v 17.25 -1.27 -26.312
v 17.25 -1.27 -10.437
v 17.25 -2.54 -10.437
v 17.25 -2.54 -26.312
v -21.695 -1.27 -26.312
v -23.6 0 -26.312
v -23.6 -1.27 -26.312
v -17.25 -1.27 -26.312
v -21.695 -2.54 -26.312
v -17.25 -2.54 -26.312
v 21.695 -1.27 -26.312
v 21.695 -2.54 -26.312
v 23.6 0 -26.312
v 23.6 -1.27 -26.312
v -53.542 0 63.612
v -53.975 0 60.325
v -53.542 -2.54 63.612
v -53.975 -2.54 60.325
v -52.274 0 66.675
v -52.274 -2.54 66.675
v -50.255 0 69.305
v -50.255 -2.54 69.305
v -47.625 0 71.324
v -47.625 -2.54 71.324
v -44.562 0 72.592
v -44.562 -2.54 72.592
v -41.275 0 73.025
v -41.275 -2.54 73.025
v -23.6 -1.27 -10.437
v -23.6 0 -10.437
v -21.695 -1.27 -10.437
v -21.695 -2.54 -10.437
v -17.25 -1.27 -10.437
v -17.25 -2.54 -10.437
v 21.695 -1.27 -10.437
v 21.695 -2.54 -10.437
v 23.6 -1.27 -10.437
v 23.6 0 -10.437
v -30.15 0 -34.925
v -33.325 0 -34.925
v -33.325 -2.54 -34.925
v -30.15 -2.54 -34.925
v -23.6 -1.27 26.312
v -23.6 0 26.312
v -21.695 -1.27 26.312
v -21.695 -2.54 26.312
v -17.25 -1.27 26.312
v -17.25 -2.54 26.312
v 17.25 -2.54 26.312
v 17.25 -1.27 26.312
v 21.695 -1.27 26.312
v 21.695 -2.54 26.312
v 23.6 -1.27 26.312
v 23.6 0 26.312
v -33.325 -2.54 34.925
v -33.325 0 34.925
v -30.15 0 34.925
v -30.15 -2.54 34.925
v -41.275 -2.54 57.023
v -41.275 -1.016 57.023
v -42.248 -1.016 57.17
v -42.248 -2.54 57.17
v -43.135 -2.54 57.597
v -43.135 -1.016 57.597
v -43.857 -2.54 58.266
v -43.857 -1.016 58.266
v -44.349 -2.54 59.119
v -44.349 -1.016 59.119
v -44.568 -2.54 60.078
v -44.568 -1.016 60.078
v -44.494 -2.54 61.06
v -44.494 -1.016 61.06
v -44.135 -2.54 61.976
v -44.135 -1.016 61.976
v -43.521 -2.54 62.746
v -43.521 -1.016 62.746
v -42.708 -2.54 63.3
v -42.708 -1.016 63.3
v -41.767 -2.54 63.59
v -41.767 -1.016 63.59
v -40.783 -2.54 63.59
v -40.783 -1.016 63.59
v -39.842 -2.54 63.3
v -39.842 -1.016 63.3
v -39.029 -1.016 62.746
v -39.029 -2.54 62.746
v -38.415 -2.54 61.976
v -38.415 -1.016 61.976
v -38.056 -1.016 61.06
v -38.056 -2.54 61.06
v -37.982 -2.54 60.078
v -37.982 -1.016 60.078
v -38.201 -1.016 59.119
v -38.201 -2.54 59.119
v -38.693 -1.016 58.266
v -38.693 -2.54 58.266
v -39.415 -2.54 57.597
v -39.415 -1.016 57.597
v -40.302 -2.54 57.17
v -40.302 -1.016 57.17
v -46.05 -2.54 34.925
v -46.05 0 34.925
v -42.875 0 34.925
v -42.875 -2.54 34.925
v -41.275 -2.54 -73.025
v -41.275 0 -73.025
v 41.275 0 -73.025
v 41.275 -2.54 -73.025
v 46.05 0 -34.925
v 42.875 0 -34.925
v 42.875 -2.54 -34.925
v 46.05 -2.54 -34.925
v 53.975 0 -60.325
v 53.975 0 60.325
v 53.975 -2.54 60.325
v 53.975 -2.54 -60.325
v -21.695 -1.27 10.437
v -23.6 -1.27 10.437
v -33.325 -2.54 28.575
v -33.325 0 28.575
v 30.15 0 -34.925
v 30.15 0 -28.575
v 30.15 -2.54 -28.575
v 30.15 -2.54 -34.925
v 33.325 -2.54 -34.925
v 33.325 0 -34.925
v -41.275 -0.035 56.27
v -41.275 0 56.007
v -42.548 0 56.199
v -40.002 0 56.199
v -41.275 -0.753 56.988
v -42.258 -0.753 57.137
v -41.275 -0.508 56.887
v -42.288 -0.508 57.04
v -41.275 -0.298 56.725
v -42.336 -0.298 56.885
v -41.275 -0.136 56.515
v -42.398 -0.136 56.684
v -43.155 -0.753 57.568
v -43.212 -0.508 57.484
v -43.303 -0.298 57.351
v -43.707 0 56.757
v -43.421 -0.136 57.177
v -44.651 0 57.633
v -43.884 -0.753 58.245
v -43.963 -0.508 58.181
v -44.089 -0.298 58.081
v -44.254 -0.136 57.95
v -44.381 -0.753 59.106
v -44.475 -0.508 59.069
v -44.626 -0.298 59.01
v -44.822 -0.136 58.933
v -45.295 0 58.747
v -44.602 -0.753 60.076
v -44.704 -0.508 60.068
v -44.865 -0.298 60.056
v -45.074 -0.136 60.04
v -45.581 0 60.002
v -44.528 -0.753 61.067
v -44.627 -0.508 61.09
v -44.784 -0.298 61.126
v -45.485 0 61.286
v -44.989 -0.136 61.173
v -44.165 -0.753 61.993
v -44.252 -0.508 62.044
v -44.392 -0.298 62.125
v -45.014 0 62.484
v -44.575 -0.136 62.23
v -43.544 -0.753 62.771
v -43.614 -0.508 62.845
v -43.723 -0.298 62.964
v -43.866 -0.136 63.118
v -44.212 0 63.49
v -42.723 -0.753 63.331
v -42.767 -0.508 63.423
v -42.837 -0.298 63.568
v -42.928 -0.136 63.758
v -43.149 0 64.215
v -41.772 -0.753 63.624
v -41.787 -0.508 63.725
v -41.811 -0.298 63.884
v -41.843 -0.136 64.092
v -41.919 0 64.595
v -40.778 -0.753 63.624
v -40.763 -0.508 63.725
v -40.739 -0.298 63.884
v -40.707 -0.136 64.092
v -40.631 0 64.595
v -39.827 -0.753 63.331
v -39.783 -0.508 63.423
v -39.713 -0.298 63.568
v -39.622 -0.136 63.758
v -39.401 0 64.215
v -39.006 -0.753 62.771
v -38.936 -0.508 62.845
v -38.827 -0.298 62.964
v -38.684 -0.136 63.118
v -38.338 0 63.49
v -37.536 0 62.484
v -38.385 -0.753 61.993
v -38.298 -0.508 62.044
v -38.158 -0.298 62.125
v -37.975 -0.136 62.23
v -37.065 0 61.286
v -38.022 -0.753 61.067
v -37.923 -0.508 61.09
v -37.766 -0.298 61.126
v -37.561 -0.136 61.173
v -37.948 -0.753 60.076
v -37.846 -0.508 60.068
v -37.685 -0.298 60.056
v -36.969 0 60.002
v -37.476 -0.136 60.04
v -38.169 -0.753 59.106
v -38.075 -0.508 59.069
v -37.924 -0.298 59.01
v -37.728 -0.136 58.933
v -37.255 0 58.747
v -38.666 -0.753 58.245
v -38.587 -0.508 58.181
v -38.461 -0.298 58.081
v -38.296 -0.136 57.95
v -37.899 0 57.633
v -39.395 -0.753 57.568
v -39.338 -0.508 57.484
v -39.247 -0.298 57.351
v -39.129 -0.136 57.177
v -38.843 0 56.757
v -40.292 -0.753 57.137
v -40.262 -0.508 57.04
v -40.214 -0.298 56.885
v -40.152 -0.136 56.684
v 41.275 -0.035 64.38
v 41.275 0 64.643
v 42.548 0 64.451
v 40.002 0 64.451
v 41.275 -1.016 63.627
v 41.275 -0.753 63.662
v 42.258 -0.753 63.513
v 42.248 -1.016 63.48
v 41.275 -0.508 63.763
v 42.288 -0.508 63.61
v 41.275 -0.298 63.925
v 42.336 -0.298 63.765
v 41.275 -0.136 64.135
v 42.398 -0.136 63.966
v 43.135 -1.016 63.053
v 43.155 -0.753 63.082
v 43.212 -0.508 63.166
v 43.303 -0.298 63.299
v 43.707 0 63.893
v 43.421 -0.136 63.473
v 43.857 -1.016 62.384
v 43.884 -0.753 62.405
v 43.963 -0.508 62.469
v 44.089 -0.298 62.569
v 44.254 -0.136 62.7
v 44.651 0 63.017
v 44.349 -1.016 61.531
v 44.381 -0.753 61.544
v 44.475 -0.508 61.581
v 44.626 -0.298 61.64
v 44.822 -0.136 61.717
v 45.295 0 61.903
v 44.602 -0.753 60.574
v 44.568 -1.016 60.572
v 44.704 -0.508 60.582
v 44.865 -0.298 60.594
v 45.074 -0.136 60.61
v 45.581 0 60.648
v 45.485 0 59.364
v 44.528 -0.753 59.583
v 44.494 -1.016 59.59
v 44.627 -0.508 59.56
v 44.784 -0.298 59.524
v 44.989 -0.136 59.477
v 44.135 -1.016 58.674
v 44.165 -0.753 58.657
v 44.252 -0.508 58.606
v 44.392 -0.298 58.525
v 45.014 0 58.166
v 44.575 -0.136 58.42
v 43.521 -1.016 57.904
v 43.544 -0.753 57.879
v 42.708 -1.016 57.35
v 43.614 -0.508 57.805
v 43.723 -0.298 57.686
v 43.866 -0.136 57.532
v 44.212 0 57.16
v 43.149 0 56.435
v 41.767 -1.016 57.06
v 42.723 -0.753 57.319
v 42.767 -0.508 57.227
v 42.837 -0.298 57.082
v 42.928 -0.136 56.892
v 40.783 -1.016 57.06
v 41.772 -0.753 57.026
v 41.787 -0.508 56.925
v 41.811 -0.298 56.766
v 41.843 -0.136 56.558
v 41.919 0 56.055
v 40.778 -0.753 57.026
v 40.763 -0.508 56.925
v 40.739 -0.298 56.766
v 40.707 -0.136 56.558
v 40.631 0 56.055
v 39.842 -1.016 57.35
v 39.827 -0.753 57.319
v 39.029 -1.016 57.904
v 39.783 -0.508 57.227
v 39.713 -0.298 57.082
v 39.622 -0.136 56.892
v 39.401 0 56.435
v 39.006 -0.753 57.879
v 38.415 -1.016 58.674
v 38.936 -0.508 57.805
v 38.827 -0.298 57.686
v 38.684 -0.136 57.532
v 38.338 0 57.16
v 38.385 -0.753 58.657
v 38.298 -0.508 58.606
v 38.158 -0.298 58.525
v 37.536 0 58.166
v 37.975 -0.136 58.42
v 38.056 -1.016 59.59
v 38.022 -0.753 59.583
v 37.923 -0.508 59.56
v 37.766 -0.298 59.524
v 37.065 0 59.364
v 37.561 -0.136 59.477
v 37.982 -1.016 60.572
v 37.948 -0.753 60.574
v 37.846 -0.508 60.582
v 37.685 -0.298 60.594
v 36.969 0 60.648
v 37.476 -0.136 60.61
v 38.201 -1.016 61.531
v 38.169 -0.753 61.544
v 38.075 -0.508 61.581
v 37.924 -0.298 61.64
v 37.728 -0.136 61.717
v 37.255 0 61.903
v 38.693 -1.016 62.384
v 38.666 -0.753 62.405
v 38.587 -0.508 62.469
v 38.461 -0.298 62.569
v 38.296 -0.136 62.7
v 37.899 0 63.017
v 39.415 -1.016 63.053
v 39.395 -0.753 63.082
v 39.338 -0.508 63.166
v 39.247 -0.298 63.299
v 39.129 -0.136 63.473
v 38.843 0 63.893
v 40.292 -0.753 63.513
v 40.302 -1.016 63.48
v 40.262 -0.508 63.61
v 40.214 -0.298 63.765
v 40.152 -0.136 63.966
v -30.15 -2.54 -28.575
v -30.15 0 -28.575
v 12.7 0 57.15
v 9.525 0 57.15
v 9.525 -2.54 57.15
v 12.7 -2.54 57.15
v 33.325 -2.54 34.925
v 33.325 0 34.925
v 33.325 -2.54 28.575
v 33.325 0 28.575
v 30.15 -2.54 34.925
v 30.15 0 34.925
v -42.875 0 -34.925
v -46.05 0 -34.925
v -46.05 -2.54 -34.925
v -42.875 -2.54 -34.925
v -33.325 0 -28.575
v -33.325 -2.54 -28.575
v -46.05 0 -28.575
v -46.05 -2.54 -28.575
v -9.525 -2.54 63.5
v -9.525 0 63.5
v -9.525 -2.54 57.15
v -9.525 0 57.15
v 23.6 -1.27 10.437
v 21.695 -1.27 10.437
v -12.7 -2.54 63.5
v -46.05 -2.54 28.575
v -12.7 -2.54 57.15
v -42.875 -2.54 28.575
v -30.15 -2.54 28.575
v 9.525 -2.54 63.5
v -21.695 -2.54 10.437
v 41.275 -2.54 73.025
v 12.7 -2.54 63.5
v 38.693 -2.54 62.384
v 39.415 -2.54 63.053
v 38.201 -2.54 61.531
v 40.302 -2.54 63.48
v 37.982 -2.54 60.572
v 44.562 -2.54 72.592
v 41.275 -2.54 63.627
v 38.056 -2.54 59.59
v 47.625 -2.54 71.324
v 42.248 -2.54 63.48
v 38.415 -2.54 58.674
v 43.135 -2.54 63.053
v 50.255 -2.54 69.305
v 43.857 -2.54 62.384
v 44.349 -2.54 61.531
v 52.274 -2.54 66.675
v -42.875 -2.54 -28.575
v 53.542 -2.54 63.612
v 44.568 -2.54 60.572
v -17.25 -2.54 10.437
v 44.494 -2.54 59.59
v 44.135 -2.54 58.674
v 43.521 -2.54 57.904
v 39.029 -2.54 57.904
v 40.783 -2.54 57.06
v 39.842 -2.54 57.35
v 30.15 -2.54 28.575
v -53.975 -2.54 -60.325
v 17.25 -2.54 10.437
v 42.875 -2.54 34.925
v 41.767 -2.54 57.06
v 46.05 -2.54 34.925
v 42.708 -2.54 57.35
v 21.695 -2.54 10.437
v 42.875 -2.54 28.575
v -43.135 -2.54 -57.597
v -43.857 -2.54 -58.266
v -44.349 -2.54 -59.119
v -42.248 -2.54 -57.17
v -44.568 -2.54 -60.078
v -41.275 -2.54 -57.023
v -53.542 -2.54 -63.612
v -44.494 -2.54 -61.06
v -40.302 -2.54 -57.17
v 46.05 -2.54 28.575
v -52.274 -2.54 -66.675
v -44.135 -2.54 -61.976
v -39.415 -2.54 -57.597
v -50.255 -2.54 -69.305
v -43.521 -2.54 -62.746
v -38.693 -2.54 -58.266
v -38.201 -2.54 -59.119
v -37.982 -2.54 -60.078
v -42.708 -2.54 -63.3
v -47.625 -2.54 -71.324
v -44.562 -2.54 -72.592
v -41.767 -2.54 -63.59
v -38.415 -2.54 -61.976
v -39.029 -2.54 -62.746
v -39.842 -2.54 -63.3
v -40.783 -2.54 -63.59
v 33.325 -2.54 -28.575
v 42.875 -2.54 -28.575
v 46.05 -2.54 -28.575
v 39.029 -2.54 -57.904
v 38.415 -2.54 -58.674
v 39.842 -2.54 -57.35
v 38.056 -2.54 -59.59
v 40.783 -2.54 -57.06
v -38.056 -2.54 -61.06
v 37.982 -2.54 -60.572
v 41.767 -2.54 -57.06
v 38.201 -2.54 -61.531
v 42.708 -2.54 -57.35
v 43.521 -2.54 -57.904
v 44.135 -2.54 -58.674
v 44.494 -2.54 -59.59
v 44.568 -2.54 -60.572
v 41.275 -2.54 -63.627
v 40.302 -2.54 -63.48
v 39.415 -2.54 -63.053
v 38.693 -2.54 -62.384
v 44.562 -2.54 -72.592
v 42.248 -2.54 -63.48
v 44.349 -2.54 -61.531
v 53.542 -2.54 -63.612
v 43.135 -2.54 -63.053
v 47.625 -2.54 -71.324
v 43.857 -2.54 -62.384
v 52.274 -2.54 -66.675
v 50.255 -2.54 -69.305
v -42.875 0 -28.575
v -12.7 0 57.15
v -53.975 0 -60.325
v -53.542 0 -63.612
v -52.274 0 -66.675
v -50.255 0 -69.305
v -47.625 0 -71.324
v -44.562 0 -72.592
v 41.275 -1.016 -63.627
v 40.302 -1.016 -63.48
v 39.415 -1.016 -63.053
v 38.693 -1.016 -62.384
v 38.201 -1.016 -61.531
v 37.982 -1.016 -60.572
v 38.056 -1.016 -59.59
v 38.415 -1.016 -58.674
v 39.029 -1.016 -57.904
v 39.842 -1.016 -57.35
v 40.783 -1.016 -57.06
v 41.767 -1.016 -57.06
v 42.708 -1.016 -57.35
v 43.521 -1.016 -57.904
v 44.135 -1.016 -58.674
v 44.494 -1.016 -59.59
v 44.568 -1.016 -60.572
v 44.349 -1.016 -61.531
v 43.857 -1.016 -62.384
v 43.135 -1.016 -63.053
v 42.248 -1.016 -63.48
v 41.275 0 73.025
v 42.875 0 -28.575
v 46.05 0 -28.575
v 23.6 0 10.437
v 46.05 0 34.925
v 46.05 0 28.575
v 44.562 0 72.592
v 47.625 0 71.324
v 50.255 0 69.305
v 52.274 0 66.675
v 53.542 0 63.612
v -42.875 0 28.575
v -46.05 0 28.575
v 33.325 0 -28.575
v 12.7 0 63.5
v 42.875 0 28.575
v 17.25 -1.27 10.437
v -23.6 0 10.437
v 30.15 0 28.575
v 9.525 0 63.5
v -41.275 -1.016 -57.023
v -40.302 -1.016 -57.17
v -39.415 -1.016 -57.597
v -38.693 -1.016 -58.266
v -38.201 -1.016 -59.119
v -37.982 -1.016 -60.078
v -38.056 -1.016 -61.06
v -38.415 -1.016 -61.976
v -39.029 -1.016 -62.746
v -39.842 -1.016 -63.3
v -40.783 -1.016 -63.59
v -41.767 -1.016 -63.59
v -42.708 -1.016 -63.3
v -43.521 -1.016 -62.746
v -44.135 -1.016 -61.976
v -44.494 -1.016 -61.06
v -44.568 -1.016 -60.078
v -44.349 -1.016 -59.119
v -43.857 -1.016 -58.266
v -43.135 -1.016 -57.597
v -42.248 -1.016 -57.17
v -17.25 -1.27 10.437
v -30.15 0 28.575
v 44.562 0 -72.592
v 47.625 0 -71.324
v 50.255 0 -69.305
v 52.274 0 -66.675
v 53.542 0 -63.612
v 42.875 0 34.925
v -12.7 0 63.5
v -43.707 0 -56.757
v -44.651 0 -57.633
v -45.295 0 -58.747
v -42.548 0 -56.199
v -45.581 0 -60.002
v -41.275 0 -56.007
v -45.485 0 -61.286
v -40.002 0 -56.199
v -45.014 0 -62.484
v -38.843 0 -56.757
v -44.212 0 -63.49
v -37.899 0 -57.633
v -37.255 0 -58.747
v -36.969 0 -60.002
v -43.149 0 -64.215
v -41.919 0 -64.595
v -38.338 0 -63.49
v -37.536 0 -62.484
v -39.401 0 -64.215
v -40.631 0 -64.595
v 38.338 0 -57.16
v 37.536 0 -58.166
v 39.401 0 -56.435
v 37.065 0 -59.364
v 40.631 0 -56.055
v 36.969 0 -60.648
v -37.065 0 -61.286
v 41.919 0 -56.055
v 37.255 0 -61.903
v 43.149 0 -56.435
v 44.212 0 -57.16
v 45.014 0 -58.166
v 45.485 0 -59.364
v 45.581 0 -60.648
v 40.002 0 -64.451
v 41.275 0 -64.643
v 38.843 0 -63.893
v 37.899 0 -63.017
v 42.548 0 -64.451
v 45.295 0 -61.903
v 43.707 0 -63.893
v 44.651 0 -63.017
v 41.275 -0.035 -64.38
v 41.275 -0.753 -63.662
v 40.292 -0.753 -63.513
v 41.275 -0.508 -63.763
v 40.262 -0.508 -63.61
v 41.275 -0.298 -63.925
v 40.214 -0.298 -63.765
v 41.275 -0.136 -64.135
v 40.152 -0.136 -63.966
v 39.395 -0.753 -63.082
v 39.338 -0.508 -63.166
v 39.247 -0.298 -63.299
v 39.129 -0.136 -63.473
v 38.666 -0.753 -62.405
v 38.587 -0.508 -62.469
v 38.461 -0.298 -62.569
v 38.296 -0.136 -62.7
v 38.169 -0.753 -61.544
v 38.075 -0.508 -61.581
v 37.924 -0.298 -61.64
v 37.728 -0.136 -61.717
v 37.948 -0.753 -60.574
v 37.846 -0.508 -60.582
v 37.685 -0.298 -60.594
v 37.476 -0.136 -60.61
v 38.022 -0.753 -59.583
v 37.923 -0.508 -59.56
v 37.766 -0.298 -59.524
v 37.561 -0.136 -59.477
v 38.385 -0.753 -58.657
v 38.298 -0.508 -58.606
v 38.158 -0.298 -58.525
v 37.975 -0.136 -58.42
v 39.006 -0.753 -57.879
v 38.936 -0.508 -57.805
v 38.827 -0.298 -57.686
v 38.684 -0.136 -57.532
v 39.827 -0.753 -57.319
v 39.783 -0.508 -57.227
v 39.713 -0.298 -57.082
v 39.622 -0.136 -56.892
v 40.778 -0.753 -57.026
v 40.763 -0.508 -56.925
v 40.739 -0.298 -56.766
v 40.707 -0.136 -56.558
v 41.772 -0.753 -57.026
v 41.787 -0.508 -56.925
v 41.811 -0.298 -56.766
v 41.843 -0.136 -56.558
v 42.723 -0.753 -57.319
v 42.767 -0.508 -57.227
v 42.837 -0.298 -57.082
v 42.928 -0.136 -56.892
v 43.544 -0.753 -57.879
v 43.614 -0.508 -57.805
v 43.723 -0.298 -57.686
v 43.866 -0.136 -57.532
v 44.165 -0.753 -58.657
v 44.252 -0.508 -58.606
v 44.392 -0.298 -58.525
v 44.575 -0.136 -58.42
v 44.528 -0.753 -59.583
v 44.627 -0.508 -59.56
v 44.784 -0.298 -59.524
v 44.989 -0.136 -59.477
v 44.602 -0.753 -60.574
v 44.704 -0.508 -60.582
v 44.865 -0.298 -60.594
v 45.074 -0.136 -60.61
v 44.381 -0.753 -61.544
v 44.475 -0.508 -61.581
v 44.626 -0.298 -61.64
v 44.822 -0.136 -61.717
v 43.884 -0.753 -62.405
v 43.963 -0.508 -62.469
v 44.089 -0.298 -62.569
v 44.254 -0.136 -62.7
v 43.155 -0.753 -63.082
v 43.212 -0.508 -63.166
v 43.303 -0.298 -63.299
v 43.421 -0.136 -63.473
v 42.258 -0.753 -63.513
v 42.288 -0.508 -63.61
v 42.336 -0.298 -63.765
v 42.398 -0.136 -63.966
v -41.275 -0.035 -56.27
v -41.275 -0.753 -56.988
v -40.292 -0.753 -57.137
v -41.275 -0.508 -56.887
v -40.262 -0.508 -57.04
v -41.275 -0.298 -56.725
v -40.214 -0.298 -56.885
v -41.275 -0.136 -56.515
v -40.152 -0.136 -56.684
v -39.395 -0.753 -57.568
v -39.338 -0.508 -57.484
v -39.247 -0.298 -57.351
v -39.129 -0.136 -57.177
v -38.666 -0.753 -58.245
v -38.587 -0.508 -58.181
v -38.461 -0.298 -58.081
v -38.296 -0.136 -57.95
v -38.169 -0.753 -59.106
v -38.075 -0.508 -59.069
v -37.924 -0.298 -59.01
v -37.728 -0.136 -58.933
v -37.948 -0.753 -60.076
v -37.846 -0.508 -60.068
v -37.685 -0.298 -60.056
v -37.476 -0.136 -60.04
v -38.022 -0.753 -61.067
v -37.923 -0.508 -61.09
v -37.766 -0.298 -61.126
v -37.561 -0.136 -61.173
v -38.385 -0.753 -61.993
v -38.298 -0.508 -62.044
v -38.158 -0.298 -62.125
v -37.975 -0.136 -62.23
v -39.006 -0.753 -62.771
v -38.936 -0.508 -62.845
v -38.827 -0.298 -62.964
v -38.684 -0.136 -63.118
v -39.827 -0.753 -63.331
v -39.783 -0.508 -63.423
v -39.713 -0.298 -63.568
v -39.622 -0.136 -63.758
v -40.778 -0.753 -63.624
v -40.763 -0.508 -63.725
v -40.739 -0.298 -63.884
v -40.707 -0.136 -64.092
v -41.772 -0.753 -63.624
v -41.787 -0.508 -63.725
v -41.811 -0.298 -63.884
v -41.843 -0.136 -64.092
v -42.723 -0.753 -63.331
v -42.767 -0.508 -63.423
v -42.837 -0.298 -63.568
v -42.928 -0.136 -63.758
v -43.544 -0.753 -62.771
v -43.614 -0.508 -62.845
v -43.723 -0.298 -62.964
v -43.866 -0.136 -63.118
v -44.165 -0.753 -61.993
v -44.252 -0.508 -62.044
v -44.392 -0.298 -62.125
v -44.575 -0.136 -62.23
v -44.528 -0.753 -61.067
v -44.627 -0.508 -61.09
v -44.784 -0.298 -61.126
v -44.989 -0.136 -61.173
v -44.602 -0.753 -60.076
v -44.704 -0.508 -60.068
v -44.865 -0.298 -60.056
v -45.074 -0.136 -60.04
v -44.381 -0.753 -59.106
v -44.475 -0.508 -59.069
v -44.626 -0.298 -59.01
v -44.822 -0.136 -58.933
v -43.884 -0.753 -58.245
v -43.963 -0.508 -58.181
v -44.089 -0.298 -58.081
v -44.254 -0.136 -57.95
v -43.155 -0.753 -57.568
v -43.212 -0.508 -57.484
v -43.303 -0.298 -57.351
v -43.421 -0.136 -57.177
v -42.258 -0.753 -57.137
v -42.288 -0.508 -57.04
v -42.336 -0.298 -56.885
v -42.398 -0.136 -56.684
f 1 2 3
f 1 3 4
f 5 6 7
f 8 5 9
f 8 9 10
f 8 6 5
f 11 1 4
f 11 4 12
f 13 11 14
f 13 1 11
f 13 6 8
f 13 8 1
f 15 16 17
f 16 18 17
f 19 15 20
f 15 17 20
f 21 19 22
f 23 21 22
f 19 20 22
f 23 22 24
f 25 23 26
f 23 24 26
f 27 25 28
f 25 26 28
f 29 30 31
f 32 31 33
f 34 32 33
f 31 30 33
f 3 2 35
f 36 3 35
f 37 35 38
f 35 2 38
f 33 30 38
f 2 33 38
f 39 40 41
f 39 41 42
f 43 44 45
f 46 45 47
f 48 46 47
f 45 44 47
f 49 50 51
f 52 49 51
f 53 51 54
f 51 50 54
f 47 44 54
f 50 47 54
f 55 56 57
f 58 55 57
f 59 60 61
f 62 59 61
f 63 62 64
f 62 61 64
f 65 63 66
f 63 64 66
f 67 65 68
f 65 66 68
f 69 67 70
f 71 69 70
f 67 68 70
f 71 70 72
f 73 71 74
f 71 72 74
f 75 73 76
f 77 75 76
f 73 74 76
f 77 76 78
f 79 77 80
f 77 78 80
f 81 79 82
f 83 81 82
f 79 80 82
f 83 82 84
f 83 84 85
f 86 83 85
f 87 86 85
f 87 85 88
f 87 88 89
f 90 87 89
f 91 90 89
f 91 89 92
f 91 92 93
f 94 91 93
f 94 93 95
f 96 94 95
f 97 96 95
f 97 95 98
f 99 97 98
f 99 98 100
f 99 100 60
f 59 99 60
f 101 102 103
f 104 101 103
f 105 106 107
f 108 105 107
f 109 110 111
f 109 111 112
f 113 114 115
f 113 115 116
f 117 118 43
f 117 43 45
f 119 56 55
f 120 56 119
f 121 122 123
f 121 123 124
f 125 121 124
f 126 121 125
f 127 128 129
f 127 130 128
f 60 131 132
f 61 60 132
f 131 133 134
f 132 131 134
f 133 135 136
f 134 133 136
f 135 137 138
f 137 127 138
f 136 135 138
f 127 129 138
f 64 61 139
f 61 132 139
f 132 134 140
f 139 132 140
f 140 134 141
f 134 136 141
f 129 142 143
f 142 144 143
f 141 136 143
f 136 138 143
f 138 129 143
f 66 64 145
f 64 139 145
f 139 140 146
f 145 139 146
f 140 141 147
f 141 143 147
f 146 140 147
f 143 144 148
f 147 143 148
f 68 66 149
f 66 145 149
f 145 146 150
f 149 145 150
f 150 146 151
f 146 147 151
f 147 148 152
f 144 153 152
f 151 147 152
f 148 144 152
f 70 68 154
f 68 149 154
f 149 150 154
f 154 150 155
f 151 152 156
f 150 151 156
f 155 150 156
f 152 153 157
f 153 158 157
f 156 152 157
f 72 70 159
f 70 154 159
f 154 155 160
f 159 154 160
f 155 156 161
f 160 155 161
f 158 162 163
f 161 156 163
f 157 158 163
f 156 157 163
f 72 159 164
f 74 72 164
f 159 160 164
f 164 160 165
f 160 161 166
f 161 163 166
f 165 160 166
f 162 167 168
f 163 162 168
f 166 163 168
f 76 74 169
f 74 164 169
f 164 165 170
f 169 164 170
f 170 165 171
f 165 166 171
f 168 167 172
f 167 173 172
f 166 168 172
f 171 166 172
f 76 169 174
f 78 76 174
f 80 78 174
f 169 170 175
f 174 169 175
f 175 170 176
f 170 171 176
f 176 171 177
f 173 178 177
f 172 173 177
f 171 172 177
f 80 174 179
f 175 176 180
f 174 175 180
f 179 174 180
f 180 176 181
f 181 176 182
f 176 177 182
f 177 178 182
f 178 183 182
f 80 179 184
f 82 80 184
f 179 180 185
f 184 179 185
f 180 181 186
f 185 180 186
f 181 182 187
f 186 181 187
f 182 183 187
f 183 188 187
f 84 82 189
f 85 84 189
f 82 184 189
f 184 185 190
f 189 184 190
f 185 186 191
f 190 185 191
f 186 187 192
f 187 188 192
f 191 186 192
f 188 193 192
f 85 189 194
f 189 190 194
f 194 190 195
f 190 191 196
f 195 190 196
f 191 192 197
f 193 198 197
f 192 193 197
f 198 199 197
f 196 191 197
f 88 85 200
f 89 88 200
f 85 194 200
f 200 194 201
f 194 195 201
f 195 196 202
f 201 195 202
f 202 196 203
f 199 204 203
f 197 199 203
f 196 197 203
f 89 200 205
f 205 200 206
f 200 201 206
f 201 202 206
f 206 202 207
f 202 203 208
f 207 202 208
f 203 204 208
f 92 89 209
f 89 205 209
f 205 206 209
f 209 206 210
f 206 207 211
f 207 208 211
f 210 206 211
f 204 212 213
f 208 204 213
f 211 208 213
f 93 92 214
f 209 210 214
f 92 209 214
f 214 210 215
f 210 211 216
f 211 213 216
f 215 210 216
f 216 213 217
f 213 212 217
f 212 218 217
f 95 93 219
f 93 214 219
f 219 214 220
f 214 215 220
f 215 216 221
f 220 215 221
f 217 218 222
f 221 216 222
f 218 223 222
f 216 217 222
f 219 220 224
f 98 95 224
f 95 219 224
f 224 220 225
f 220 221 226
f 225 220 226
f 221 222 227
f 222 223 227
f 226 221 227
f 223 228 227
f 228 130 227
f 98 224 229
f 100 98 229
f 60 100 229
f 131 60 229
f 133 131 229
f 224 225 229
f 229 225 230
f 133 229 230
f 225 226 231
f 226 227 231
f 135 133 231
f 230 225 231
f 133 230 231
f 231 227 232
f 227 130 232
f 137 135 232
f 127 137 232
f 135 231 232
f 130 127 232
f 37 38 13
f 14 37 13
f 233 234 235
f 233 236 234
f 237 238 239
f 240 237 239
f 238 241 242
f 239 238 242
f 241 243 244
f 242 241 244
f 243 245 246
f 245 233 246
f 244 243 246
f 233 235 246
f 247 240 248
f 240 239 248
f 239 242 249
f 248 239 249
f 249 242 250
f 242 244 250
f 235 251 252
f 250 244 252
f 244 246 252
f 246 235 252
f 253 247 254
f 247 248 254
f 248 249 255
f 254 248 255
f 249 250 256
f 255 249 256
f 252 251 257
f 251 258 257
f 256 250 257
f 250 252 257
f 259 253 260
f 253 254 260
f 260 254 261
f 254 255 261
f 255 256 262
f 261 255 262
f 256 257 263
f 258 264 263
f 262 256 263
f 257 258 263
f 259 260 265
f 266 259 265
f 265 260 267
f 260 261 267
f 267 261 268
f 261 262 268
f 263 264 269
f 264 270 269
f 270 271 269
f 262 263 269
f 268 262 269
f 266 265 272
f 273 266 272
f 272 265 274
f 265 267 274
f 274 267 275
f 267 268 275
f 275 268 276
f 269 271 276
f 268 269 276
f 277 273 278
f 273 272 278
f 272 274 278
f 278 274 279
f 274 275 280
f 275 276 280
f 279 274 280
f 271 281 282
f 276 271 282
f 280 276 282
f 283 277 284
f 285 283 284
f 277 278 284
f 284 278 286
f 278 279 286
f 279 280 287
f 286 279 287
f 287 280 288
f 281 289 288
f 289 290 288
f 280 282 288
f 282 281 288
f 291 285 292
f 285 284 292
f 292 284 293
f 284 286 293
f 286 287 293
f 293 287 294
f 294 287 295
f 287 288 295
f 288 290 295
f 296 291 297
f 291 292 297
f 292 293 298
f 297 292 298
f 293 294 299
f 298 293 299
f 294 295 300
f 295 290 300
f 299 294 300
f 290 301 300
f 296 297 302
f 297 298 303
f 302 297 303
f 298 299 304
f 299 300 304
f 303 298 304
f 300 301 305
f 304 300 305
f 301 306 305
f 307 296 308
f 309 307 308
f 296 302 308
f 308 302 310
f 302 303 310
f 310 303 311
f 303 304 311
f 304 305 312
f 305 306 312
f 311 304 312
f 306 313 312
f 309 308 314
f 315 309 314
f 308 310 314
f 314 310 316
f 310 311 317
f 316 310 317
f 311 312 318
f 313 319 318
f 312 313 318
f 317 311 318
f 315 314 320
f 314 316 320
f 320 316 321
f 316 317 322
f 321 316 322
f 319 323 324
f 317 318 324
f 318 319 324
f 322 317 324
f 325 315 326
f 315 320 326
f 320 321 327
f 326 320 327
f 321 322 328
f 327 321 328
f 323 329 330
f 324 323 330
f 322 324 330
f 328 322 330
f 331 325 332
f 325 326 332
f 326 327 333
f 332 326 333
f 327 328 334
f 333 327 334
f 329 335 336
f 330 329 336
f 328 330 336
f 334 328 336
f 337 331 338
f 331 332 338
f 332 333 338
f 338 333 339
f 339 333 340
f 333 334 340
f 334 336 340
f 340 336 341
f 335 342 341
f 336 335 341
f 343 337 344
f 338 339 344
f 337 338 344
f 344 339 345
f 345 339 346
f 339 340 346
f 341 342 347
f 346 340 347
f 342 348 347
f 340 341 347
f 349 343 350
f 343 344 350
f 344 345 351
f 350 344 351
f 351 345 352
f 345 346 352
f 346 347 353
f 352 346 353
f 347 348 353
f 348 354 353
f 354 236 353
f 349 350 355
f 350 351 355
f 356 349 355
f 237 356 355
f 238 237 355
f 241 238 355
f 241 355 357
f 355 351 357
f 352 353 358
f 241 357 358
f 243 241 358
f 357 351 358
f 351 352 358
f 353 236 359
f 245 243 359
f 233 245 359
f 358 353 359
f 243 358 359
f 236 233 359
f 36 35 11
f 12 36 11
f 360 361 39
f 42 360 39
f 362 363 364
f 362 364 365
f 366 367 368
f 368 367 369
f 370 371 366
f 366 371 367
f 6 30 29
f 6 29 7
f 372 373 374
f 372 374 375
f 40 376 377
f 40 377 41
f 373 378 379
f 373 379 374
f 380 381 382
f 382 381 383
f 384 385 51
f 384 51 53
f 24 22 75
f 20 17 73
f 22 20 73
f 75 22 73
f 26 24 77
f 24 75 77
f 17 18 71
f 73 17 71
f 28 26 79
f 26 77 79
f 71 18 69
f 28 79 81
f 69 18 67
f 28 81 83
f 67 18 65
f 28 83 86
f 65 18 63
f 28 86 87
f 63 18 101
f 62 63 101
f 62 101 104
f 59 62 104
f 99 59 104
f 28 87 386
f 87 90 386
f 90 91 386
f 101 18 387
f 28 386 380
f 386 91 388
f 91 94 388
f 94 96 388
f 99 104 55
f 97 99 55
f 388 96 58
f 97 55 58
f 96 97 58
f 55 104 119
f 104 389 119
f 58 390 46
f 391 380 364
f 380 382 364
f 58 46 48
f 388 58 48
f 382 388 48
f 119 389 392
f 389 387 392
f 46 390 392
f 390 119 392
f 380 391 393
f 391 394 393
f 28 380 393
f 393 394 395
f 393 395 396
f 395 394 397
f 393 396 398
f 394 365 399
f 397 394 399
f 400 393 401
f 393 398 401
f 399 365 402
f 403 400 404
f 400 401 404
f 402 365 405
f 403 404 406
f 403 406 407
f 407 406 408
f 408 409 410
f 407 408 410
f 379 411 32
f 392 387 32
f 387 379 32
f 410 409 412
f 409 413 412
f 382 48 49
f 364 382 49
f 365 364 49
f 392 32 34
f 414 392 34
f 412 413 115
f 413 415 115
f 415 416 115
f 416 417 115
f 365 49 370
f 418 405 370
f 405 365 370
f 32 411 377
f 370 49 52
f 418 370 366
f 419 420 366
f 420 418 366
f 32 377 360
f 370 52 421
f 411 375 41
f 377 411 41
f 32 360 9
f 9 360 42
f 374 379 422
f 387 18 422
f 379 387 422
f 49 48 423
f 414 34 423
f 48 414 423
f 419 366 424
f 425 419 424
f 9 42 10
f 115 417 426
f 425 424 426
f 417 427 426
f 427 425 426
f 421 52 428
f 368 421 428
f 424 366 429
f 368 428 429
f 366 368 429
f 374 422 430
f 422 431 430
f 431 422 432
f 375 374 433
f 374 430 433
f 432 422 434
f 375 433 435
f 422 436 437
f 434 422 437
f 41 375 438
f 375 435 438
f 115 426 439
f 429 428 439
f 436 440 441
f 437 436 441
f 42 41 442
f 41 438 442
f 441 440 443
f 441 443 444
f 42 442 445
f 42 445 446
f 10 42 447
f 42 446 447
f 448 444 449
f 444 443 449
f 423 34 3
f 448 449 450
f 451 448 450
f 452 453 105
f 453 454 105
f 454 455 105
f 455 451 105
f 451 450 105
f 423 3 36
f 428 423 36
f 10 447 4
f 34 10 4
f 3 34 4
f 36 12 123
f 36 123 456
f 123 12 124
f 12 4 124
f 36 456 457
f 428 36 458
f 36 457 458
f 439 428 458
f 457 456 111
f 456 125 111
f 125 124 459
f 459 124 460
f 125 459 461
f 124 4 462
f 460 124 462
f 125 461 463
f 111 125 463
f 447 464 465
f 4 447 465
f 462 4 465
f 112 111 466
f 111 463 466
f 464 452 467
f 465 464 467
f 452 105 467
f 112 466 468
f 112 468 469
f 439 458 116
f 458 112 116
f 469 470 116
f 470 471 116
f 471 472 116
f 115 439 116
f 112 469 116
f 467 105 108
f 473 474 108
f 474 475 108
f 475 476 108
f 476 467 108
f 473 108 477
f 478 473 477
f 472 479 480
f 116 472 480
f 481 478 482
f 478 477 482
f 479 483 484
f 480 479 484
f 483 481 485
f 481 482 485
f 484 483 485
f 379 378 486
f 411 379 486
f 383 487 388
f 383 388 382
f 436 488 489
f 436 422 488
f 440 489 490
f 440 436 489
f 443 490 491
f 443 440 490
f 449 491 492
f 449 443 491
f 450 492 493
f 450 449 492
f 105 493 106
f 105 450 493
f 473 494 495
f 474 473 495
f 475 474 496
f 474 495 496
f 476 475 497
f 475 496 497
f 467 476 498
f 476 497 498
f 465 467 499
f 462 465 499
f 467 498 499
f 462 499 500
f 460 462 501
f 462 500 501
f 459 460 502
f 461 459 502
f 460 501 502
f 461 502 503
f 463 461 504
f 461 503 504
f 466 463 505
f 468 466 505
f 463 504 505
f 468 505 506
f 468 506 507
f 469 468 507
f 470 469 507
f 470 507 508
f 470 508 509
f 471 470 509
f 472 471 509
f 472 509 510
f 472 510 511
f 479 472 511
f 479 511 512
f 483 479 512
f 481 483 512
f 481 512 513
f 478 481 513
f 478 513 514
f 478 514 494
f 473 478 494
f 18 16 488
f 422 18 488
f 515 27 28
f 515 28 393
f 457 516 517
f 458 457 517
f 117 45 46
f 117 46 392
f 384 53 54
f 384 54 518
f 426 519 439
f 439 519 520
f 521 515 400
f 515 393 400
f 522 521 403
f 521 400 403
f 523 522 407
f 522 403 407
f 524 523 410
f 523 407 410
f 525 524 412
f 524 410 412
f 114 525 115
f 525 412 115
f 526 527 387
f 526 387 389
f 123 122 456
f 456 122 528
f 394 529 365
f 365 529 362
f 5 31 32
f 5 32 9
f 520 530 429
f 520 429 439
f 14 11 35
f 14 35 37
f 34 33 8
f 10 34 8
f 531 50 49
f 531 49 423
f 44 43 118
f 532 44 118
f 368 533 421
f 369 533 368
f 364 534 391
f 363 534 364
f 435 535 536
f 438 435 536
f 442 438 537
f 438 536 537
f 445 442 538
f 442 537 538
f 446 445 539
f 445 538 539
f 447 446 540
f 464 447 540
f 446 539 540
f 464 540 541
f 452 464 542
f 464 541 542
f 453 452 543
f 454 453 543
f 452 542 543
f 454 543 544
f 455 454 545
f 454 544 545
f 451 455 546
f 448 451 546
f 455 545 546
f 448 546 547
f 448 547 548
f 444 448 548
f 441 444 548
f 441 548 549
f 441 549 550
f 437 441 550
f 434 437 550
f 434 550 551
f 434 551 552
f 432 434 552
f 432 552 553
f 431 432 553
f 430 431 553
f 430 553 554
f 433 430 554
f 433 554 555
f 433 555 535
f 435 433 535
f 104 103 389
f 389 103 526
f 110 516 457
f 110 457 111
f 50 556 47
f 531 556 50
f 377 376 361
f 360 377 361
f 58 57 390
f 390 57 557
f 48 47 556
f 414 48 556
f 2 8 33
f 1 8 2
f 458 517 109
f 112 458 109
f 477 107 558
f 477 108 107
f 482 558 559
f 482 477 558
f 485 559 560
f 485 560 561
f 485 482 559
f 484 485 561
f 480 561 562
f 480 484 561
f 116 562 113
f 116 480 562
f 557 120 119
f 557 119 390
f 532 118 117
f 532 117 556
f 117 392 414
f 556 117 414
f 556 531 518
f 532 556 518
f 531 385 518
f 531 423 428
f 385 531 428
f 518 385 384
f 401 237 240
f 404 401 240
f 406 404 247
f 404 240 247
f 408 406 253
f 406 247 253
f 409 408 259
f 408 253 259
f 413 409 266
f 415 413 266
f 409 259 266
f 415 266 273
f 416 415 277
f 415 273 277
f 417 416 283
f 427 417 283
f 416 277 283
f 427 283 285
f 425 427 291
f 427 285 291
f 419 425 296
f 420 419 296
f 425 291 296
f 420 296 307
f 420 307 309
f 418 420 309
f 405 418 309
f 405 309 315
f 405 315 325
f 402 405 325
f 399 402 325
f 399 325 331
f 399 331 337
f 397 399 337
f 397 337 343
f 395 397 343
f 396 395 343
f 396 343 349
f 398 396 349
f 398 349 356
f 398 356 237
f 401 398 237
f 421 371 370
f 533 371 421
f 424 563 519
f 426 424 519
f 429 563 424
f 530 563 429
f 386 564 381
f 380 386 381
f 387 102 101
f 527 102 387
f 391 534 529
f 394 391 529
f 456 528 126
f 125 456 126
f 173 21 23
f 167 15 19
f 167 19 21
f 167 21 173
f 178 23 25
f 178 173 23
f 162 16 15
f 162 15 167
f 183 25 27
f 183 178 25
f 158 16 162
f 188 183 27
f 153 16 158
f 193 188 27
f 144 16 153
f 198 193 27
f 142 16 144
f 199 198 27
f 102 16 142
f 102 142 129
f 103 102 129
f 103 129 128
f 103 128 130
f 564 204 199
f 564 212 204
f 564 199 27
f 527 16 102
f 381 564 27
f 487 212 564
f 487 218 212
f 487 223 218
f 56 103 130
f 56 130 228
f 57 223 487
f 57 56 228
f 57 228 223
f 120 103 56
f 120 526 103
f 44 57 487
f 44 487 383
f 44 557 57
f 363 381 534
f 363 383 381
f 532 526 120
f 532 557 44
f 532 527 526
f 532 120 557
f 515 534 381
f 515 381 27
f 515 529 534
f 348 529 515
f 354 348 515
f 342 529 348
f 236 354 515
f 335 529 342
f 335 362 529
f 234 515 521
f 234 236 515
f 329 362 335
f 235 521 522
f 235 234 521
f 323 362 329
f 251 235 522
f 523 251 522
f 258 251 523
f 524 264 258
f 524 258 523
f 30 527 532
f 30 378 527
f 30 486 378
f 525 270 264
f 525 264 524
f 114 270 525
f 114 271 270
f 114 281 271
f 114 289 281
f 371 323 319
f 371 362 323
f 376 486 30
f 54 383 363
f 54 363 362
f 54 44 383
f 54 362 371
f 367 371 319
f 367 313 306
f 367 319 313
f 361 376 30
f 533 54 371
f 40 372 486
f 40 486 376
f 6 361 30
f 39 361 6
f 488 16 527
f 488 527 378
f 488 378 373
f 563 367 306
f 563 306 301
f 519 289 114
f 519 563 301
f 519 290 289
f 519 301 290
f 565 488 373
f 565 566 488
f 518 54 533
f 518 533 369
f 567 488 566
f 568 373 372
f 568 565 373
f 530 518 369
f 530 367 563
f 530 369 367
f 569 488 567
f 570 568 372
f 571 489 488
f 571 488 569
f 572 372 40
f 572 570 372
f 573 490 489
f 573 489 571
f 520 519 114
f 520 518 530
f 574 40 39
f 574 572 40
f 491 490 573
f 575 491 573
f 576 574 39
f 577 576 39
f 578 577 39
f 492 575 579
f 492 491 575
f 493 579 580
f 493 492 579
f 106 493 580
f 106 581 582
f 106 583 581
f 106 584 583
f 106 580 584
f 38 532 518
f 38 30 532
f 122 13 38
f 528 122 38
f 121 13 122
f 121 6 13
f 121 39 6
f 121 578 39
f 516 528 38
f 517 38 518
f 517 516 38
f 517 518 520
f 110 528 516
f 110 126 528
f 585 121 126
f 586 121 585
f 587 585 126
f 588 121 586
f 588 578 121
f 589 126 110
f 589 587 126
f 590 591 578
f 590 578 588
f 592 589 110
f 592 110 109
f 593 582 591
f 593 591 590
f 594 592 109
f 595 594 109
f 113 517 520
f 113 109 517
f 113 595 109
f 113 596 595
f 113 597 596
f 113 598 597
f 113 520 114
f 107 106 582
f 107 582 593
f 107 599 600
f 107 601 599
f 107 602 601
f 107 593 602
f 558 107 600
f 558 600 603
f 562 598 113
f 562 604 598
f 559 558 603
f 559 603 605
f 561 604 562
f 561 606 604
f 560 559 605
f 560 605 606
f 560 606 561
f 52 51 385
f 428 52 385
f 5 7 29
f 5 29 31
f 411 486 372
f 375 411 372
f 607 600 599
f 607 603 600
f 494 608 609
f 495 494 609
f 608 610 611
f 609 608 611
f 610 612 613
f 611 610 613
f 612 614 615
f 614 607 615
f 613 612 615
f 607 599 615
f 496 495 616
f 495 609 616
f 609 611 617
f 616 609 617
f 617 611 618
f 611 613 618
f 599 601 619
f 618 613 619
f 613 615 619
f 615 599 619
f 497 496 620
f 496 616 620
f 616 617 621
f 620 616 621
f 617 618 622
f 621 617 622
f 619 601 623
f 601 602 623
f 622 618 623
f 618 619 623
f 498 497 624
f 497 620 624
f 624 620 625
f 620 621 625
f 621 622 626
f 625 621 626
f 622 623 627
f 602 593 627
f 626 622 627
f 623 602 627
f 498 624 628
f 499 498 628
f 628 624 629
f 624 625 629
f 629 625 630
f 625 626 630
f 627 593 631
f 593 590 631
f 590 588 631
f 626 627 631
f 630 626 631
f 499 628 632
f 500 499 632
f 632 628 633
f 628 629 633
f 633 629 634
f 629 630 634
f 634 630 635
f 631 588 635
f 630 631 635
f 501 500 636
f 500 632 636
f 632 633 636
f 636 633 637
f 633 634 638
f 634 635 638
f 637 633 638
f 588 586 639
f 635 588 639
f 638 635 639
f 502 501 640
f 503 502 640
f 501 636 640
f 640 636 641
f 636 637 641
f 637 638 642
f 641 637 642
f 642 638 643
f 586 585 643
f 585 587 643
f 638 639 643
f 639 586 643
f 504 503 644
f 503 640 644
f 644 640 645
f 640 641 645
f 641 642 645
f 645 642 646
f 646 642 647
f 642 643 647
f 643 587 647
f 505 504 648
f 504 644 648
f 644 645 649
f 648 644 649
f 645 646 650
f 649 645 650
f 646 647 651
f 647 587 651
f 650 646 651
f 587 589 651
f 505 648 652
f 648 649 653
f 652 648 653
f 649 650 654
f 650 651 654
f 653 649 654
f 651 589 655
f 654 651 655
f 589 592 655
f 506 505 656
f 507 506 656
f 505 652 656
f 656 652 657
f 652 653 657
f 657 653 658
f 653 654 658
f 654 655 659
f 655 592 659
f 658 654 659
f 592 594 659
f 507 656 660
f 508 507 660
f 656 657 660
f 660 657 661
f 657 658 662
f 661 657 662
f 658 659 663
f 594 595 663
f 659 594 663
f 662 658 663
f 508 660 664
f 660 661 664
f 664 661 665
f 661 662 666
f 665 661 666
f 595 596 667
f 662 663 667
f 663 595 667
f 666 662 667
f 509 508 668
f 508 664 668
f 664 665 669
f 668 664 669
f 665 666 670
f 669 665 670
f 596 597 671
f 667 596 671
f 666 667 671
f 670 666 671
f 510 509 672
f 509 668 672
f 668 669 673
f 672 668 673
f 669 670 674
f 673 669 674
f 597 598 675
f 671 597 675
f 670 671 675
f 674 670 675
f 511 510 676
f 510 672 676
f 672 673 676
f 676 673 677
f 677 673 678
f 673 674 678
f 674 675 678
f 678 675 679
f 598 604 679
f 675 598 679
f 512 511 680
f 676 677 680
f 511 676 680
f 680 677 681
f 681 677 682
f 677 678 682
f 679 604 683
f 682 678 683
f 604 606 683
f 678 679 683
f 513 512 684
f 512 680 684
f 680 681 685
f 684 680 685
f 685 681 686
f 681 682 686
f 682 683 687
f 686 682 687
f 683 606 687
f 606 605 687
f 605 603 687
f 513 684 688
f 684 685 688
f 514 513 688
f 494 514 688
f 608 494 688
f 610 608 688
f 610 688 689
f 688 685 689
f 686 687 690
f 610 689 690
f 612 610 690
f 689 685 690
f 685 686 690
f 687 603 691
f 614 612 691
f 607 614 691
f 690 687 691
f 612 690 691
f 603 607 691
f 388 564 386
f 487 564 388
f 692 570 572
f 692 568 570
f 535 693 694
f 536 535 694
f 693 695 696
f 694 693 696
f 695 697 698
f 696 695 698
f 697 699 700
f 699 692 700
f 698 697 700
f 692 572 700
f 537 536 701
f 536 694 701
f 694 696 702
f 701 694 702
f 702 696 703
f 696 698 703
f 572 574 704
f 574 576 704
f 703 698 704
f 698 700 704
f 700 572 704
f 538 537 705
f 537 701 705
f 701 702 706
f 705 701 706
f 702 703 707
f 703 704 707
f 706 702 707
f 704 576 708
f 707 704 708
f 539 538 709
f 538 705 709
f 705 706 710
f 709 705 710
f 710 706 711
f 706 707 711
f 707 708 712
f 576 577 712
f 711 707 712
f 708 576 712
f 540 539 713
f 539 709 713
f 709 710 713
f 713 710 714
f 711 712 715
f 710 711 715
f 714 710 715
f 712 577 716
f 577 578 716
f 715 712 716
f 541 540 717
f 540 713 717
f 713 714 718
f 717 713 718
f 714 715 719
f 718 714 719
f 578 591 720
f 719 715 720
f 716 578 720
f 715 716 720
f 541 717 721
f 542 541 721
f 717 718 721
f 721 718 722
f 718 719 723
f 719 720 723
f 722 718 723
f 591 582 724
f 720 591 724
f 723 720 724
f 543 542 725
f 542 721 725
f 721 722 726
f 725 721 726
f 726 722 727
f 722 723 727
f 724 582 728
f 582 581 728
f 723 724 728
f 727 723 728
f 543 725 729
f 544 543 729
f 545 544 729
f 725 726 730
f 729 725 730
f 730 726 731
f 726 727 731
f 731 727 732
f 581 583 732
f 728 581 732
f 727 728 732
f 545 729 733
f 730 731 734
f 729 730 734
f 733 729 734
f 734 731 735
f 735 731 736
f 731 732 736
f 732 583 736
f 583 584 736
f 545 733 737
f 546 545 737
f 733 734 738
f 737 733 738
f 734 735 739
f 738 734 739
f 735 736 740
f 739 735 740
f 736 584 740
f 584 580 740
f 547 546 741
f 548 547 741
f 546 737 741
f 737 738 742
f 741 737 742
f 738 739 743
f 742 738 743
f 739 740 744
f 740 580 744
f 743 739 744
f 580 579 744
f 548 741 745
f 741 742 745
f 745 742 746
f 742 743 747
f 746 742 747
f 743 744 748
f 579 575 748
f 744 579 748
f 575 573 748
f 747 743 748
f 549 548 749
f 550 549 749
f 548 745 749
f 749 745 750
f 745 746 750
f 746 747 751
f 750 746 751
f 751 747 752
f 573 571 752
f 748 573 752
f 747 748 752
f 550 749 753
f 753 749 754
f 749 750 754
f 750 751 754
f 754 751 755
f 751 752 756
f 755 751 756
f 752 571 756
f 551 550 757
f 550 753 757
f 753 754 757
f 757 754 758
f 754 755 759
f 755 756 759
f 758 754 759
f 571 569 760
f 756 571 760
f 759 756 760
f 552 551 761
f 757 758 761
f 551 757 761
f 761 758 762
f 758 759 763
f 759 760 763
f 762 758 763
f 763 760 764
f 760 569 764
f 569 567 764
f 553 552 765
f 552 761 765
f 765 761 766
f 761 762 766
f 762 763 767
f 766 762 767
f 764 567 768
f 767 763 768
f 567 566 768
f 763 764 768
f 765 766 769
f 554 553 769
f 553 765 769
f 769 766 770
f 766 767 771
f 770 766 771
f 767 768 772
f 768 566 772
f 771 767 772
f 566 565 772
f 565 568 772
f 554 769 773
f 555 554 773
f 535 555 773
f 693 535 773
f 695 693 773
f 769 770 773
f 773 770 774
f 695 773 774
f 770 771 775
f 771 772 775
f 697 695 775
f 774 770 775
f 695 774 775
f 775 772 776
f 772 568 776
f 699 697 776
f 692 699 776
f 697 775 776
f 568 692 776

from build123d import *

# Parameters (mm, degrees)
SKETCH1_W           = 107.95
SKETCH1_H           = 146.05
BOSS_EXTRUDE1_DEPTH = 2.54
SKETCH2_R           = 3.302
CUT_EXTRUDE1_DEPTH  = 91.842736914
SKETCH3_W           = 4.445
SKETCH3_H           = 15.875
CUT_EXTRUDE2_DEPTH  = 91.842736914
FILLET1_R           = 12.7
SKETCH11_W          = 47.200058
SKETCH11_H          = 15.875
CUT_EXTRUDE9_DEPTH  = 1.27
FILLET2_R           = 1.016
SKETCH14_W          = 3.175
SKETCH14_H          = 6.35
CUT_EXTRUDE14_DEPTH = 91.842736914


with BuildPart() as part:
    # Sketch1 → Boss-Extrude1 (new body)
    with BuildSketch(Plane(origin=(0, 0, 0), x_dir=(1, 0, 0), z_dir=(0, 1, 0))):
        Rectangle(SKETCH1_W, SKETCH1_H)
    extrude(amount=-BOSS_EXTRUDE1_DEPTH)

    # Sketch2 → Cut-Extrude1 (cut, through all)
    with BuildSketch(Plane(origin=(0, 0, 0), x_dir=(1, 0, 0), z_dir=(0, 1, 0))):
        with Locations((-41.275, 60.325)):
            Circle(SKETCH2_R)
        with Locations((41.275, 60.325)):
            Circle(SKETCH2_R)
        with Locations((41.275, -60.325)):
            Circle(SKETCH2_R)
        with Locations((-41.275, -60.325)):
            Circle(SKETCH2_R)
    extrude(amount=-CUT_EXTRUDE1_DEPTH, mode=Mode.SUBTRACT)

    # Sketch3 → Cut-Extrude2 (cut, through all)
    with BuildSketch(Plane(origin=(0, 0, 0), x_dir=(1, 0, 0), z_dir=(0, 1, 0))):
        with Locations((-19.472529, 18.374995)):
            Rectangle(SKETCH3_W, SKETCH3_H)
        with Locations((19.472529, 18.374995)):
            Rectangle(SKETCH3_W, SKETCH3_H)
        with Locations((19.472529, -18.374995)):
            Rectangle(SKETCH3_W, SKETCH3_H)
        with Locations((-19.472529, -18.374995)):
            Rectangle(SKETCH3_W, SKETCH3_H)
    extrude(amount=-CUT_EXTRUDE2_DEPTH, mode=Mode.SUBTRACT)

    # Fillet1
    fillet1_edges = [part.edges().sort_by_distance(p)[0] for p in [
        (53.975, -1.27, -73.025),
        (53.975, -1.27, 73.025),
        (-53.975, -1.27, 73.025),
        (-53.975, -1.27, -73.025),
    ]]
    fillet(fillet1_edges, radius=FILLET1_R)

    # Sketch11 → Cut-Extrude9 (cut, symmetric)
    with BuildSketch(Plane(origin=(0, 0, 0), x_dir=(1, 0, 0), z_dir=(0, 1, 0))):
        with Locations((0, -18.374995)):
            Rectangle(SKETCH11_W, SKETCH11_H)
        with Locations((0, 18.374995)):
            Rectangle(SKETCH11_W, SKETCH11_H)
    extrude(amount=CUT_EXTRUDE9_DEPTH, both=True, mode=Mode.SUBTRACT)

    # Fillet2
    fillet2_edges = [part.edges().sort_by_distance(p)[0] for p in [
        (37.973, 0, -60.325),
        (-44.577, 0, -60.325),
        (-44.577, 0, 60.325),
        (37.973, 0, 60.325),
    ]]
    fillet(fillet2_edges, radius=FILLET2_R)

    # Sketch14 → Cut-Extrude14 (cut, through all)
    with BuildSketch(Plane(origin=(0, 0, 0), x_dir=(1, 0, 0), z_dir=(0, 1, 0))):
        with Locations((31.7373, -31.75)):
            Rectangle(SKETCH14_W, SKETCH14_H)
        with Locations((-31.7373, -31.75)):
            Rectangle(SKETCH14_W, SKETCH14_H)
        with Locations((-31.7373, 31.75)):
            Rectangle(SKETCH14_W, SKETCH14_H)
        with Locations((31.7373, 31.75)):
            Rectangle(SKETCH14_W, SKETCH14_H)
        with Locations((-11.1125, -60.325)):
            Rectangle(SKETCH14_W, SKETCH14_H)
        with Locations((11.1125, -60.325)):
            Rectangle(SKETCH14_W, SKETCH14_H)
        with Locations((44.4627, 31.75)):
            Rectangle(SKETCH14_W, SKETCH14_H)
        with Locations((44.4627, -31.75)):
            Rectangle(SKETCH14_W, SKETCH14_H)
        with Locations((-44.4627, 31.75)):
            Rectangle(SKETCH14_W, SKETCH14_H)
        with Locations((-44.4627, -31.75)):
            Rectangle(SKETCH14_W, SKETCH14_H)
    extrude(amount=-CUT_EXTRUDE14_DEPTH, mode=Mode.SUBTRACT)


solid = part.part
